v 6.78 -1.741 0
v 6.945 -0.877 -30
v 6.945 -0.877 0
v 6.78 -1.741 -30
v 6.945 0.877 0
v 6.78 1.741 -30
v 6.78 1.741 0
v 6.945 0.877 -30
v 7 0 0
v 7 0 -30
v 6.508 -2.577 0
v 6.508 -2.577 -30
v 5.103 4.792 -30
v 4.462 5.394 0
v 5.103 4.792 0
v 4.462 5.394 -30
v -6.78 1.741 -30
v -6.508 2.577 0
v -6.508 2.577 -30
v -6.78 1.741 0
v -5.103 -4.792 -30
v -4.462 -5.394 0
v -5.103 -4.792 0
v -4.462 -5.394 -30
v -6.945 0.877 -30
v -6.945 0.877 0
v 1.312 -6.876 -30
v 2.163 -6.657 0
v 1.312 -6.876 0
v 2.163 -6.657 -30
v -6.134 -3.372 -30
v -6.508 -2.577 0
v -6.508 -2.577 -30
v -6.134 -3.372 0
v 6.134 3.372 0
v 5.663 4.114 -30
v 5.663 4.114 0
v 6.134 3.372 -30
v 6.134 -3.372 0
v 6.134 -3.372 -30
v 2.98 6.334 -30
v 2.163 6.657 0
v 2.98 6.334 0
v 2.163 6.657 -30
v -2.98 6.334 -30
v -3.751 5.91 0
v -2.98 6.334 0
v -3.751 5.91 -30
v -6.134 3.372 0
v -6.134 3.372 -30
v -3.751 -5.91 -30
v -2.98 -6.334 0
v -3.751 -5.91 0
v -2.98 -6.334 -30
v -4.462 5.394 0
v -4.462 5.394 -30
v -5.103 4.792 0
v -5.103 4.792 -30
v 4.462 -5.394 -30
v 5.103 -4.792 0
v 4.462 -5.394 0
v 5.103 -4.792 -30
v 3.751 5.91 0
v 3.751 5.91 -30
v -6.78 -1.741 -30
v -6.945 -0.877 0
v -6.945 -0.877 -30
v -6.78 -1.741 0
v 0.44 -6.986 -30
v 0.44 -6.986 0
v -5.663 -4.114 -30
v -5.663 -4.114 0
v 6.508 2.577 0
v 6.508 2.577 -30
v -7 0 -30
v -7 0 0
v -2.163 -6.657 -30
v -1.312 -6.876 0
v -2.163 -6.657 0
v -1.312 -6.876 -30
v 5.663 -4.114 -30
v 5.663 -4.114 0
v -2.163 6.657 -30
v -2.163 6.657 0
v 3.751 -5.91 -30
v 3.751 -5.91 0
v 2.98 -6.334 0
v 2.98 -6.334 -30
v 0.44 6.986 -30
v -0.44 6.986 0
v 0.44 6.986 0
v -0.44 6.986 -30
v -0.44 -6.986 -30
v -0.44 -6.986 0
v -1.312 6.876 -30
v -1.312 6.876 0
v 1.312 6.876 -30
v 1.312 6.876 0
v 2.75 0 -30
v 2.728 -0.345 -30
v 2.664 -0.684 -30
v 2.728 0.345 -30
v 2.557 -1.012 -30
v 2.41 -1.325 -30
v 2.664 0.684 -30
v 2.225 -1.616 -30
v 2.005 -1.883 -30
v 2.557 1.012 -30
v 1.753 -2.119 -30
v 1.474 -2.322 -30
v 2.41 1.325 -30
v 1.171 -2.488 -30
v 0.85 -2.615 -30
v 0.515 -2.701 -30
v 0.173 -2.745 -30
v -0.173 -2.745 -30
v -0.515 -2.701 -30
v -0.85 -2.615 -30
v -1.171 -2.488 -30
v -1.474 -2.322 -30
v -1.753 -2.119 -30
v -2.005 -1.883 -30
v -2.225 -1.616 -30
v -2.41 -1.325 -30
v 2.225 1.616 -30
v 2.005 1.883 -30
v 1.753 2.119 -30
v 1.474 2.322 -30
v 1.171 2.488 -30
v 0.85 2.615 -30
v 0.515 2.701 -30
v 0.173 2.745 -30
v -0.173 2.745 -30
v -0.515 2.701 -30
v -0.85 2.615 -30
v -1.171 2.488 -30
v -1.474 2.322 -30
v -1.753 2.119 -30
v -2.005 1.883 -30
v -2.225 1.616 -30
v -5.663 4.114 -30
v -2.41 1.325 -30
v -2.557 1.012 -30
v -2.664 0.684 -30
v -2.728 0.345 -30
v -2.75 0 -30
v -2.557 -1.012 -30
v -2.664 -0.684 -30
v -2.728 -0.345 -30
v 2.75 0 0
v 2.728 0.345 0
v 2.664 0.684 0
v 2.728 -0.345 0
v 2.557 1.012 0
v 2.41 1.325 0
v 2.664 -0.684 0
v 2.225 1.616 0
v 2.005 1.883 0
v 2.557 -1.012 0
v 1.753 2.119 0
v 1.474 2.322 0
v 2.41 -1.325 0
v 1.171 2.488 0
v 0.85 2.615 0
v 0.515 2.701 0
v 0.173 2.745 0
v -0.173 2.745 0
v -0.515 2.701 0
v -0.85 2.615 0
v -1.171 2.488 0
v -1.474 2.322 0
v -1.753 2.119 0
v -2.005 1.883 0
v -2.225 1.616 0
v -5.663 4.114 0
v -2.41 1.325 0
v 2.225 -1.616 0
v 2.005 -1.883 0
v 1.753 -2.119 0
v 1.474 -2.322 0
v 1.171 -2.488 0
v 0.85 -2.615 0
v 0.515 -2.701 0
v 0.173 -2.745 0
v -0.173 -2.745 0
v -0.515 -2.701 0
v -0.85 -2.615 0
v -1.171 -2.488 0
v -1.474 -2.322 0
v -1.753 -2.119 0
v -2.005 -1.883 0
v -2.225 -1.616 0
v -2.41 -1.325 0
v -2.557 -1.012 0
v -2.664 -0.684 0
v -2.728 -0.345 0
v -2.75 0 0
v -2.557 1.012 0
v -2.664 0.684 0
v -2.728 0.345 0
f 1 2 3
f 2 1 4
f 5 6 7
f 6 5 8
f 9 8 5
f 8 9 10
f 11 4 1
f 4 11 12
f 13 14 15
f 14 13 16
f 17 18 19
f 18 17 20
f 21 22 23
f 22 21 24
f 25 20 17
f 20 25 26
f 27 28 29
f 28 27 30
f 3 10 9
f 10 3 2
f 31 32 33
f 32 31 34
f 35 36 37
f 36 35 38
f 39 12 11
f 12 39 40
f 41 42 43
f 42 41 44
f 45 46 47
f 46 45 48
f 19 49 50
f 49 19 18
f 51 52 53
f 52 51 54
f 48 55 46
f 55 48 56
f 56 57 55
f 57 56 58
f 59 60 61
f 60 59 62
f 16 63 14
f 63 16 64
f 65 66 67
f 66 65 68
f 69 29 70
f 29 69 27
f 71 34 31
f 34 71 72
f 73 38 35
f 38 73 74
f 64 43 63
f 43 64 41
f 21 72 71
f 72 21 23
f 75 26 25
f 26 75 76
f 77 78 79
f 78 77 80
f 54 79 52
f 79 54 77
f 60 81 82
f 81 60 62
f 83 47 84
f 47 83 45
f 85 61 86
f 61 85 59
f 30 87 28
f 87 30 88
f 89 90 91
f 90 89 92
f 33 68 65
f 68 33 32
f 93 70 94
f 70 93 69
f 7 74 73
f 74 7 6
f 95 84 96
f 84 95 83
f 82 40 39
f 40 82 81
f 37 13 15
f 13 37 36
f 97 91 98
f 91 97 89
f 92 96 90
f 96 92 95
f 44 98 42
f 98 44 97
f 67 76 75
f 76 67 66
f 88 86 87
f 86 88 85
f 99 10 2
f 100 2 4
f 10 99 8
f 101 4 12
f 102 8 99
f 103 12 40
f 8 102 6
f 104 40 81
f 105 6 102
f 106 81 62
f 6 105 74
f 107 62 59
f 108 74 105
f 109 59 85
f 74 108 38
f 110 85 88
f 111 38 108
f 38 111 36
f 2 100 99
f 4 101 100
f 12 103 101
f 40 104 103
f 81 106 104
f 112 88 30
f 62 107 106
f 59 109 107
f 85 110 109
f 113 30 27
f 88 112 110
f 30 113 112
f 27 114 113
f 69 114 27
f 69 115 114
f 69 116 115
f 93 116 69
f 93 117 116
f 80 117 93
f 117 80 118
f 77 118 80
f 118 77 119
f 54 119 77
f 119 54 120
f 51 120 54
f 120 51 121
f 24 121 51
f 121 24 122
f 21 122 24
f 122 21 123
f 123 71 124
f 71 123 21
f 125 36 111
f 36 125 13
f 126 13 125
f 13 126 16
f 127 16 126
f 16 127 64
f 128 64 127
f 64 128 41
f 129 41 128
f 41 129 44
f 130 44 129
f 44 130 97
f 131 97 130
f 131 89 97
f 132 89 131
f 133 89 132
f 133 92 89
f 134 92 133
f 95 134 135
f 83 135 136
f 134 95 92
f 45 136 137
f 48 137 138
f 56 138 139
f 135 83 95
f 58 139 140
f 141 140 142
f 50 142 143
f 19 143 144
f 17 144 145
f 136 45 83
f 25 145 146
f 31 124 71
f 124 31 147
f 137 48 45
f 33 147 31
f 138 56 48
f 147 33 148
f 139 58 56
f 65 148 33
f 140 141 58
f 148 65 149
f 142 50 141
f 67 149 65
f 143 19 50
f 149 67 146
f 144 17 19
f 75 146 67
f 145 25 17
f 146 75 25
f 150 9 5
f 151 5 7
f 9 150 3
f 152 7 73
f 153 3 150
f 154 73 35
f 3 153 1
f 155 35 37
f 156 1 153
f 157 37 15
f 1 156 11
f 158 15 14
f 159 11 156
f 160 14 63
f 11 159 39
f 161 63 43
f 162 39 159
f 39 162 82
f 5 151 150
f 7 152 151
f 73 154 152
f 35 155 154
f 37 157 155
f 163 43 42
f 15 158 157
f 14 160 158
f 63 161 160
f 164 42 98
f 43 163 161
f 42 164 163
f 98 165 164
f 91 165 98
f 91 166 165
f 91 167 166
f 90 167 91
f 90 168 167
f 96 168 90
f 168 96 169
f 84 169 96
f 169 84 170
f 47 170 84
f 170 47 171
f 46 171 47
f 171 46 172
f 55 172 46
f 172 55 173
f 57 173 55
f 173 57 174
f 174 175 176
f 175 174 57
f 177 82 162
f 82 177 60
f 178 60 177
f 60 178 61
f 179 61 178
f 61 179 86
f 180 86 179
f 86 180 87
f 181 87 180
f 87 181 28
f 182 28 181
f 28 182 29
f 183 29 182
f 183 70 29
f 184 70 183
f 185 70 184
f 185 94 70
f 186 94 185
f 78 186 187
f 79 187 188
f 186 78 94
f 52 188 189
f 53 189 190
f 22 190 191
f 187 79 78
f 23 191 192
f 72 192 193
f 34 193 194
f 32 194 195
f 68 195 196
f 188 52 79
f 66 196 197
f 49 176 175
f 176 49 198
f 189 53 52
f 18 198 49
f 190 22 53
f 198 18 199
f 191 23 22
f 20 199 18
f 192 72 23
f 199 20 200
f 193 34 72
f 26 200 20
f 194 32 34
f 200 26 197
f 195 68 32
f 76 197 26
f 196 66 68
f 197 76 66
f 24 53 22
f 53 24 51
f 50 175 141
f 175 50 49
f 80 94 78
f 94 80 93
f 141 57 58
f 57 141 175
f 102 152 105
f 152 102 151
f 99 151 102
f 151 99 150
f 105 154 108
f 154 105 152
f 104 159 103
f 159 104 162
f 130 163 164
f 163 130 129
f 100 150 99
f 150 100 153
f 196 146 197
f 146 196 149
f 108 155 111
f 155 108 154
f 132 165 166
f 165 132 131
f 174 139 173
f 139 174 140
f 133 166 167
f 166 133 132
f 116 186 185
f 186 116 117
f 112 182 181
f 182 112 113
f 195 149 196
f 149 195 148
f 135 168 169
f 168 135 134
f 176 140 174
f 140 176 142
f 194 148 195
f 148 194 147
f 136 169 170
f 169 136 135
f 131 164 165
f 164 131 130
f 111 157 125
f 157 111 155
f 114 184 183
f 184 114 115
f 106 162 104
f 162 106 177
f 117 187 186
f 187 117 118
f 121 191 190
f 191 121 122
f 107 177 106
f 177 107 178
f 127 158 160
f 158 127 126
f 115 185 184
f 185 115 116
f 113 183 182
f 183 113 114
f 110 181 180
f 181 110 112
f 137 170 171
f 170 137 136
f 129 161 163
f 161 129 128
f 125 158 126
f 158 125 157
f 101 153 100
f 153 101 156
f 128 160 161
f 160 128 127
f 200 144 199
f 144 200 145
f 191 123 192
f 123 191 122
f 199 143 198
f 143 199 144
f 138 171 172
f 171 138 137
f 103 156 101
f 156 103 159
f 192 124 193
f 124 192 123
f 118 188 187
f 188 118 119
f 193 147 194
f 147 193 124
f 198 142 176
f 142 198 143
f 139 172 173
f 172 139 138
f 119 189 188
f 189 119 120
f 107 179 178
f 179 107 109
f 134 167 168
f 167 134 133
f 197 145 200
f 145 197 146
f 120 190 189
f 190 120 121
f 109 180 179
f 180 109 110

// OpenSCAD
$fn = 50;


difference() {
	union() {
		translate(v = [0, 0, -30.0000000000]) {
			cylinder(h = 30, r = 7.0000000000);
		}
		cylinder(h = 0, r = 13.0000000000);
	}
	union() {
		#translate(v = [0, 0, -30]) {
			cylinder(h = 30, r = 2.7500000000);
		}
	}
}
